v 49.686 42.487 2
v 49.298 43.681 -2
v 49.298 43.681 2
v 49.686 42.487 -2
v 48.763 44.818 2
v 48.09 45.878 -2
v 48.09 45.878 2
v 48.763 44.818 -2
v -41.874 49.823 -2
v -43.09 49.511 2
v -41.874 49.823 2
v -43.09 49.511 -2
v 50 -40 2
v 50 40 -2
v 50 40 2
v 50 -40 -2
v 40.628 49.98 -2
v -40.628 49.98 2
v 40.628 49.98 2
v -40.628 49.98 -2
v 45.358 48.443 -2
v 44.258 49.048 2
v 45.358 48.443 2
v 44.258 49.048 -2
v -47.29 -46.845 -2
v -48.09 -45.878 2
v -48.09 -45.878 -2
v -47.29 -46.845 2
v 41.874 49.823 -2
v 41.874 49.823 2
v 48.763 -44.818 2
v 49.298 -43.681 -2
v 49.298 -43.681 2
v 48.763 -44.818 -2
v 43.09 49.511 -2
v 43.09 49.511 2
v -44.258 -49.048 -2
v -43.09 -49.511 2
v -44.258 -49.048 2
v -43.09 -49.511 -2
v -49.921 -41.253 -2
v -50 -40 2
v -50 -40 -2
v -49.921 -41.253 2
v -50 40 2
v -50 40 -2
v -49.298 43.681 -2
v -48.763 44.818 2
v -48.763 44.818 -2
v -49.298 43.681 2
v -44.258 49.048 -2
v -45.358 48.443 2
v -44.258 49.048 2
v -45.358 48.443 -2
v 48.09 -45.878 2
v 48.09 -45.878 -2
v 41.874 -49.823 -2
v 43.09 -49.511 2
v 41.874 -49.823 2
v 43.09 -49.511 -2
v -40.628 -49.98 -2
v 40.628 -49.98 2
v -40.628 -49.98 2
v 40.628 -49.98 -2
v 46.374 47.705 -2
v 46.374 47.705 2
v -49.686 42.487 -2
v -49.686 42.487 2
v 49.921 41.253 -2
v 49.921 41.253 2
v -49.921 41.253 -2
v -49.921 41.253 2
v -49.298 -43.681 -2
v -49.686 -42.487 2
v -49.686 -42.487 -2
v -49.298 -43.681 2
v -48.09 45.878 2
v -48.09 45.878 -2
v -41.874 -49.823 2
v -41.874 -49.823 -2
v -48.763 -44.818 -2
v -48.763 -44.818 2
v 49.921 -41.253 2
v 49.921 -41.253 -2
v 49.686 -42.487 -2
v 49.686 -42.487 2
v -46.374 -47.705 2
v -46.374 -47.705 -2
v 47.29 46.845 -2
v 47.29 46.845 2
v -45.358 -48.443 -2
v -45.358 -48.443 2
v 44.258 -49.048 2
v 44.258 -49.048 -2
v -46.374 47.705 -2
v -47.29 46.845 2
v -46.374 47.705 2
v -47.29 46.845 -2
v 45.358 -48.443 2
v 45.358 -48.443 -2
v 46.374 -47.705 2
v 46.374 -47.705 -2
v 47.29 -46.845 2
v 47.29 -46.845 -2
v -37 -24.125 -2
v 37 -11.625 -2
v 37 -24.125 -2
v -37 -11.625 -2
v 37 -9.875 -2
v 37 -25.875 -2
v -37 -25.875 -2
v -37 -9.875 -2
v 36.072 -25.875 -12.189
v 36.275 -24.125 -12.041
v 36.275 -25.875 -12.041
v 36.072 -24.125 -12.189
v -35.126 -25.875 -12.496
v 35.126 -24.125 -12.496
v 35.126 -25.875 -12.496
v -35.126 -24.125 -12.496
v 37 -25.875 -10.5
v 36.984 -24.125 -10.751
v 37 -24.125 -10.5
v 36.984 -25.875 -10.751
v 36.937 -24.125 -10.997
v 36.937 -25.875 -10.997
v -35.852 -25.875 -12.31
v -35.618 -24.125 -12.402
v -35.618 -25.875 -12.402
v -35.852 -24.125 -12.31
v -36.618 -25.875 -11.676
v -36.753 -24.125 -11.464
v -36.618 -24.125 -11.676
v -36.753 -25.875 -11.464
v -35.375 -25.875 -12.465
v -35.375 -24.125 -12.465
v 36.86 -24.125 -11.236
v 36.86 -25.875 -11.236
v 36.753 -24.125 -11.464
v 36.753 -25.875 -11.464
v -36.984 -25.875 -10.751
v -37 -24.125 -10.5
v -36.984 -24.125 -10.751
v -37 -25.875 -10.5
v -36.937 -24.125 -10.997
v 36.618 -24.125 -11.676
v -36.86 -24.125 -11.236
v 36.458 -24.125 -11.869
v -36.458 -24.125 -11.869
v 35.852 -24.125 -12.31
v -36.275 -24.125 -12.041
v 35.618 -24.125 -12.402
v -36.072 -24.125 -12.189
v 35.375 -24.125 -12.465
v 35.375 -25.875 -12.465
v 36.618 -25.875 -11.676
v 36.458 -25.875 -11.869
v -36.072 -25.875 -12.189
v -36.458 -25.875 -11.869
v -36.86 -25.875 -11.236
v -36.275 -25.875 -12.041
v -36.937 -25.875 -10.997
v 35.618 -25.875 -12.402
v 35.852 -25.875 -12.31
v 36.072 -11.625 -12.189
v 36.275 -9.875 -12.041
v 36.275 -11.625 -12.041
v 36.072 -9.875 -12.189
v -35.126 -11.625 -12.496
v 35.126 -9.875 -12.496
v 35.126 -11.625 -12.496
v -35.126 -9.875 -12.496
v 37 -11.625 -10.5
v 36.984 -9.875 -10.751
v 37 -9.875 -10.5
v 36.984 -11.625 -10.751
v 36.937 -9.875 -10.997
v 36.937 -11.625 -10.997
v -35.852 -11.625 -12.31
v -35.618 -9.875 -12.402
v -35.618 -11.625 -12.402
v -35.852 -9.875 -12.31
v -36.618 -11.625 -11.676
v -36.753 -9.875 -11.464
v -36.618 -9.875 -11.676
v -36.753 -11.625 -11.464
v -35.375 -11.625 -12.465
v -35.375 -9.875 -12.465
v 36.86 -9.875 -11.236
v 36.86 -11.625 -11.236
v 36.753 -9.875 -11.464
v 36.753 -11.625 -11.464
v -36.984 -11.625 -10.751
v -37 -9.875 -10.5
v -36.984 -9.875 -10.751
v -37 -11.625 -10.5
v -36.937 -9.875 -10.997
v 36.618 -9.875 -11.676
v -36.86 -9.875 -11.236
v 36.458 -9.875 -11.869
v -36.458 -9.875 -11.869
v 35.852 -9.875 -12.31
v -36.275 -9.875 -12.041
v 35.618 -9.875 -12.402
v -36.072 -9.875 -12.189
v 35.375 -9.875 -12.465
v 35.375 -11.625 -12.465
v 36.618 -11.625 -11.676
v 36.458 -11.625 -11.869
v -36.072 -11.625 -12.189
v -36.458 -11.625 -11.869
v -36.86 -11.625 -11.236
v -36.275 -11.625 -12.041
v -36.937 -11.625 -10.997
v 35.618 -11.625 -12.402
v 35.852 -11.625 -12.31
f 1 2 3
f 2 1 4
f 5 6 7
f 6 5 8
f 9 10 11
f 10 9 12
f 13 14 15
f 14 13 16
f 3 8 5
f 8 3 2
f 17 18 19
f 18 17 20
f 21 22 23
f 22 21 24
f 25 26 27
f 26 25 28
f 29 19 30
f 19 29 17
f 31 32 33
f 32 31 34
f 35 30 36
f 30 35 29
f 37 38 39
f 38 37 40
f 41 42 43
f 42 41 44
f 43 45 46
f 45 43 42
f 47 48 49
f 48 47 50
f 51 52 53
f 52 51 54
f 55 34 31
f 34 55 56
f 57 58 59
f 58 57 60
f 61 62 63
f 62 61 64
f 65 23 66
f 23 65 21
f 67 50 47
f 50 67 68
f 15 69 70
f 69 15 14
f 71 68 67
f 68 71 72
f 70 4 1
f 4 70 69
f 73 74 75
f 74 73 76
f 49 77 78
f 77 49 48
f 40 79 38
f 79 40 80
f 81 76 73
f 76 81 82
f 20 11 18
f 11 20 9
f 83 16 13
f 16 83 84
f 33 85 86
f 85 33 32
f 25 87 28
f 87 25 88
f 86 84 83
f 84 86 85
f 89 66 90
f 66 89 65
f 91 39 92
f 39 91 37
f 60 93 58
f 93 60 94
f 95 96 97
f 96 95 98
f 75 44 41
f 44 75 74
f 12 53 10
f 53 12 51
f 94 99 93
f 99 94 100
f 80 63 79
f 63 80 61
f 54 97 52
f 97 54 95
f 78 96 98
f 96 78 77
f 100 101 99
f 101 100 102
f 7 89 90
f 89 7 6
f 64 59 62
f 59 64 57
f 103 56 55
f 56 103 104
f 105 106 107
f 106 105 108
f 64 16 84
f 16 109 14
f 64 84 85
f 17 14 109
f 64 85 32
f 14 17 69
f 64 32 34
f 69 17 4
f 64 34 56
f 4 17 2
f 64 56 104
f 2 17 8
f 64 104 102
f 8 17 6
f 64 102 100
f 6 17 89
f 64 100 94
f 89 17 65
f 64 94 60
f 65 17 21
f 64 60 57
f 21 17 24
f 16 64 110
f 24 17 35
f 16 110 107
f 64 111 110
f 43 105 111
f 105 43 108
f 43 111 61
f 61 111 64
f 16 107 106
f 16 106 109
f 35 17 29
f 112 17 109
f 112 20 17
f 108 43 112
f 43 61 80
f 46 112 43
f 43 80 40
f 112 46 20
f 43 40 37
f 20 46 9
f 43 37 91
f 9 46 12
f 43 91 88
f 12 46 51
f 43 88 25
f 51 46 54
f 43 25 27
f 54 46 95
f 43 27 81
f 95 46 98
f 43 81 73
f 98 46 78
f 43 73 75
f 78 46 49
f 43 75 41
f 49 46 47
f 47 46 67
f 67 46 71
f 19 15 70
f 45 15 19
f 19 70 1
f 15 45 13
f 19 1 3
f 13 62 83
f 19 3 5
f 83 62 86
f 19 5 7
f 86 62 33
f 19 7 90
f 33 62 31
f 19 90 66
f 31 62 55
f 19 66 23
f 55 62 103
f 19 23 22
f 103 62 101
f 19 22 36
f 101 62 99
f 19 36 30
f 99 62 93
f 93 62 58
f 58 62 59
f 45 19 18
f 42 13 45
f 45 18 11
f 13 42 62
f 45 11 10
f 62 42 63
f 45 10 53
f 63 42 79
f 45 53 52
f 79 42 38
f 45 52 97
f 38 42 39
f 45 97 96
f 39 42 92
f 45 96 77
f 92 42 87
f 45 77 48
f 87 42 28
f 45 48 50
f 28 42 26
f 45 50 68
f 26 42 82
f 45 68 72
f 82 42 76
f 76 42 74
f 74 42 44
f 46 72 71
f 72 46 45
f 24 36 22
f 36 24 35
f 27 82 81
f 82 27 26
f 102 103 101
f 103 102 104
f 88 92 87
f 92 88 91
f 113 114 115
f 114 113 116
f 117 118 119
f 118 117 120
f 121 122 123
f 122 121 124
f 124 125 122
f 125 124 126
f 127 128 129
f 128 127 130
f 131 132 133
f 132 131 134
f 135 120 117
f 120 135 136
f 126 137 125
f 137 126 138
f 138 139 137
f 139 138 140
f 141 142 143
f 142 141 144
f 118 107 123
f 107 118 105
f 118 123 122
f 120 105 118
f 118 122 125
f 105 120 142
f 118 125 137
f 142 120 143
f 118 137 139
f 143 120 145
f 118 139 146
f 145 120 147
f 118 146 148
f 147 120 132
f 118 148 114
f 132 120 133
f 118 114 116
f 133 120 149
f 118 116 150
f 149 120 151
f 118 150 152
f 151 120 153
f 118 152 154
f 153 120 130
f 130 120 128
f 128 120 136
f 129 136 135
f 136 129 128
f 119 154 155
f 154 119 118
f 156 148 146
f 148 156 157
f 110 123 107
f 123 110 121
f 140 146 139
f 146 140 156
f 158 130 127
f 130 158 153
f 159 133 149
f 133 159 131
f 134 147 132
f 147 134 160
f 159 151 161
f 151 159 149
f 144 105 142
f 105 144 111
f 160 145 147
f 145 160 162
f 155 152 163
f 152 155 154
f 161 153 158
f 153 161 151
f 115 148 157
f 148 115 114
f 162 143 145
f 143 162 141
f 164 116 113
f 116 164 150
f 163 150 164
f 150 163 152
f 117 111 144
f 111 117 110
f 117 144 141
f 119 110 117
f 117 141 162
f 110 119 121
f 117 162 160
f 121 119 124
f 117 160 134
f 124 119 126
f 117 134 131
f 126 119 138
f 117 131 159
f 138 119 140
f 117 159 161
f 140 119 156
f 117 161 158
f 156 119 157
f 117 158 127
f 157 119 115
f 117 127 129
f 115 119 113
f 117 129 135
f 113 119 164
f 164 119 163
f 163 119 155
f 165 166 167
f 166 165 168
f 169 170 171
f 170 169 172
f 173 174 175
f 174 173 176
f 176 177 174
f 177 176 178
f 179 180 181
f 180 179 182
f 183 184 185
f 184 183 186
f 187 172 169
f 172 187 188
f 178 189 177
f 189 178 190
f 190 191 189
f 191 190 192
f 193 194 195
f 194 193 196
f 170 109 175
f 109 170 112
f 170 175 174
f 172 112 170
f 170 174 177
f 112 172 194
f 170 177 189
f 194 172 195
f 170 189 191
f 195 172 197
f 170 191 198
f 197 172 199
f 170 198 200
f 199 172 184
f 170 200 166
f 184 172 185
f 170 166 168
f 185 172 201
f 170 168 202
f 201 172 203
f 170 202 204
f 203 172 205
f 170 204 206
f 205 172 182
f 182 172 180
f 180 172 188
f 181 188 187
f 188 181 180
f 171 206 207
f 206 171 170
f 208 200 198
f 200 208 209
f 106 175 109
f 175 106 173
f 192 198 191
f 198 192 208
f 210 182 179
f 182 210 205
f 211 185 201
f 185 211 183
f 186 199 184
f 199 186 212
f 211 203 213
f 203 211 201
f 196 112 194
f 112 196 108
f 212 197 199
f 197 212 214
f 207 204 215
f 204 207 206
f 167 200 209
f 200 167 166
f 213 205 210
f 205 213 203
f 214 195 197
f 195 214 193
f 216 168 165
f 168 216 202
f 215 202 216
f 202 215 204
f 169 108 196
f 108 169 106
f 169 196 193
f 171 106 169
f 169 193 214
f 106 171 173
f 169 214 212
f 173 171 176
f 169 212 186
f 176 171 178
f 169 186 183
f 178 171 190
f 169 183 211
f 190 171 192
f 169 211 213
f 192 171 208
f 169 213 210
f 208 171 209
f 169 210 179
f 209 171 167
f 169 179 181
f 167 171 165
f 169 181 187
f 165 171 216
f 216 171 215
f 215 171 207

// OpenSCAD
/**************************************************************************** 
Title: Roku Shelf TV Mount

Description: This script is intended to generate a shelf that can be mounted on top of a TV. The shelf is sized to support a Roku Premiere but can be customized to support other STB sizes.

Author: Ross MacDonald
Created In: 2019-02-09 

License: Attribution-NonCommercial-ShareAlike 4.0 International (CC BY-NC-SA 4.0)
License Link: https://creativecommons.org/licenses/by-nc-sa/4.0/

/***************************************************************************/

// Customizable Settings

// Size of the Set top box. 
// 90 x 90 mm works great for the Roku Premiere.
shelf_width = 90;
shelf_depth = 90;

// Tab configuration - this is what clamps onto your TV
// Tab spacing is the thickness of the top of your TV
tab_spacing = 13.5;
// How far offset is the tab from the front of the shelf
first_tab_offset = -25;

// No need to modify anything below here
tab_depth = 10;
shelf_height = 3;
tab_width = 0.8 * shelf_width;
tab_height = shelf_height/4;
second_tab_offset = first_tab_offset + tab_spacing + tab_height;
tab_rounded_edge_radius = 2;
rounded_edge_radius = 10;
rounded_fudge = 1;

rounded_cube([shelf_width, 
    shelf_depth, 
    shelf_height], 
    rounded_edge_radius);

translate([0, first_tab_offset, -((tab_depth + shelf_height)/2)])
{
    rotate([-90,0,0])
    {
        rounded_cube([tab_width, 
            tab_depth, 
            tab_height], 
            tab_rounded_edge_radius);
    }
}

translate([0, first_tab_offset, -(shelf_height / 2)])
{
    rotate([-90,0,0])
    {
        cube([tab_width + tab_rounded_edge_radius, 
            tab_depth / 1.5, 
            tab_height + rounded_fudge], 
            center=true);
    }
}

translate([0, second_tab_offset, -((tab_depth + shelf_height) / 2)])
{
    rotate([-90,0,0])
    {
        rounded_cube([tab_width, 
            tab_depth, 
            tab_height], 
            tab_rounded_edge_radius);
    }
}

translate([0, second_tab_offset, -(shelf_height / 2)])
{
    rotate([-90,0,0])
    {
        cube([tab_width  + tab_rounded_edge_radius,
            tab_depth / 2,
            tab_height + rounded_fudge],
            center=true);
    }
}

// The following code was based heavily on the example here:
// https://en.wikibooks.org/wiki/OpenSCAD_User_Manual/The_OpenSCAD_Language#minkowski
module rounded_cube(size, radius)
{
    $fn=50;
    x = size[0]-radius;
    y = size[1]-radius;
    minkowski()
    {
        cube(size=[x,y,size[2]], center=true);
        cylinder(r=radius, center=true);
    }
}
